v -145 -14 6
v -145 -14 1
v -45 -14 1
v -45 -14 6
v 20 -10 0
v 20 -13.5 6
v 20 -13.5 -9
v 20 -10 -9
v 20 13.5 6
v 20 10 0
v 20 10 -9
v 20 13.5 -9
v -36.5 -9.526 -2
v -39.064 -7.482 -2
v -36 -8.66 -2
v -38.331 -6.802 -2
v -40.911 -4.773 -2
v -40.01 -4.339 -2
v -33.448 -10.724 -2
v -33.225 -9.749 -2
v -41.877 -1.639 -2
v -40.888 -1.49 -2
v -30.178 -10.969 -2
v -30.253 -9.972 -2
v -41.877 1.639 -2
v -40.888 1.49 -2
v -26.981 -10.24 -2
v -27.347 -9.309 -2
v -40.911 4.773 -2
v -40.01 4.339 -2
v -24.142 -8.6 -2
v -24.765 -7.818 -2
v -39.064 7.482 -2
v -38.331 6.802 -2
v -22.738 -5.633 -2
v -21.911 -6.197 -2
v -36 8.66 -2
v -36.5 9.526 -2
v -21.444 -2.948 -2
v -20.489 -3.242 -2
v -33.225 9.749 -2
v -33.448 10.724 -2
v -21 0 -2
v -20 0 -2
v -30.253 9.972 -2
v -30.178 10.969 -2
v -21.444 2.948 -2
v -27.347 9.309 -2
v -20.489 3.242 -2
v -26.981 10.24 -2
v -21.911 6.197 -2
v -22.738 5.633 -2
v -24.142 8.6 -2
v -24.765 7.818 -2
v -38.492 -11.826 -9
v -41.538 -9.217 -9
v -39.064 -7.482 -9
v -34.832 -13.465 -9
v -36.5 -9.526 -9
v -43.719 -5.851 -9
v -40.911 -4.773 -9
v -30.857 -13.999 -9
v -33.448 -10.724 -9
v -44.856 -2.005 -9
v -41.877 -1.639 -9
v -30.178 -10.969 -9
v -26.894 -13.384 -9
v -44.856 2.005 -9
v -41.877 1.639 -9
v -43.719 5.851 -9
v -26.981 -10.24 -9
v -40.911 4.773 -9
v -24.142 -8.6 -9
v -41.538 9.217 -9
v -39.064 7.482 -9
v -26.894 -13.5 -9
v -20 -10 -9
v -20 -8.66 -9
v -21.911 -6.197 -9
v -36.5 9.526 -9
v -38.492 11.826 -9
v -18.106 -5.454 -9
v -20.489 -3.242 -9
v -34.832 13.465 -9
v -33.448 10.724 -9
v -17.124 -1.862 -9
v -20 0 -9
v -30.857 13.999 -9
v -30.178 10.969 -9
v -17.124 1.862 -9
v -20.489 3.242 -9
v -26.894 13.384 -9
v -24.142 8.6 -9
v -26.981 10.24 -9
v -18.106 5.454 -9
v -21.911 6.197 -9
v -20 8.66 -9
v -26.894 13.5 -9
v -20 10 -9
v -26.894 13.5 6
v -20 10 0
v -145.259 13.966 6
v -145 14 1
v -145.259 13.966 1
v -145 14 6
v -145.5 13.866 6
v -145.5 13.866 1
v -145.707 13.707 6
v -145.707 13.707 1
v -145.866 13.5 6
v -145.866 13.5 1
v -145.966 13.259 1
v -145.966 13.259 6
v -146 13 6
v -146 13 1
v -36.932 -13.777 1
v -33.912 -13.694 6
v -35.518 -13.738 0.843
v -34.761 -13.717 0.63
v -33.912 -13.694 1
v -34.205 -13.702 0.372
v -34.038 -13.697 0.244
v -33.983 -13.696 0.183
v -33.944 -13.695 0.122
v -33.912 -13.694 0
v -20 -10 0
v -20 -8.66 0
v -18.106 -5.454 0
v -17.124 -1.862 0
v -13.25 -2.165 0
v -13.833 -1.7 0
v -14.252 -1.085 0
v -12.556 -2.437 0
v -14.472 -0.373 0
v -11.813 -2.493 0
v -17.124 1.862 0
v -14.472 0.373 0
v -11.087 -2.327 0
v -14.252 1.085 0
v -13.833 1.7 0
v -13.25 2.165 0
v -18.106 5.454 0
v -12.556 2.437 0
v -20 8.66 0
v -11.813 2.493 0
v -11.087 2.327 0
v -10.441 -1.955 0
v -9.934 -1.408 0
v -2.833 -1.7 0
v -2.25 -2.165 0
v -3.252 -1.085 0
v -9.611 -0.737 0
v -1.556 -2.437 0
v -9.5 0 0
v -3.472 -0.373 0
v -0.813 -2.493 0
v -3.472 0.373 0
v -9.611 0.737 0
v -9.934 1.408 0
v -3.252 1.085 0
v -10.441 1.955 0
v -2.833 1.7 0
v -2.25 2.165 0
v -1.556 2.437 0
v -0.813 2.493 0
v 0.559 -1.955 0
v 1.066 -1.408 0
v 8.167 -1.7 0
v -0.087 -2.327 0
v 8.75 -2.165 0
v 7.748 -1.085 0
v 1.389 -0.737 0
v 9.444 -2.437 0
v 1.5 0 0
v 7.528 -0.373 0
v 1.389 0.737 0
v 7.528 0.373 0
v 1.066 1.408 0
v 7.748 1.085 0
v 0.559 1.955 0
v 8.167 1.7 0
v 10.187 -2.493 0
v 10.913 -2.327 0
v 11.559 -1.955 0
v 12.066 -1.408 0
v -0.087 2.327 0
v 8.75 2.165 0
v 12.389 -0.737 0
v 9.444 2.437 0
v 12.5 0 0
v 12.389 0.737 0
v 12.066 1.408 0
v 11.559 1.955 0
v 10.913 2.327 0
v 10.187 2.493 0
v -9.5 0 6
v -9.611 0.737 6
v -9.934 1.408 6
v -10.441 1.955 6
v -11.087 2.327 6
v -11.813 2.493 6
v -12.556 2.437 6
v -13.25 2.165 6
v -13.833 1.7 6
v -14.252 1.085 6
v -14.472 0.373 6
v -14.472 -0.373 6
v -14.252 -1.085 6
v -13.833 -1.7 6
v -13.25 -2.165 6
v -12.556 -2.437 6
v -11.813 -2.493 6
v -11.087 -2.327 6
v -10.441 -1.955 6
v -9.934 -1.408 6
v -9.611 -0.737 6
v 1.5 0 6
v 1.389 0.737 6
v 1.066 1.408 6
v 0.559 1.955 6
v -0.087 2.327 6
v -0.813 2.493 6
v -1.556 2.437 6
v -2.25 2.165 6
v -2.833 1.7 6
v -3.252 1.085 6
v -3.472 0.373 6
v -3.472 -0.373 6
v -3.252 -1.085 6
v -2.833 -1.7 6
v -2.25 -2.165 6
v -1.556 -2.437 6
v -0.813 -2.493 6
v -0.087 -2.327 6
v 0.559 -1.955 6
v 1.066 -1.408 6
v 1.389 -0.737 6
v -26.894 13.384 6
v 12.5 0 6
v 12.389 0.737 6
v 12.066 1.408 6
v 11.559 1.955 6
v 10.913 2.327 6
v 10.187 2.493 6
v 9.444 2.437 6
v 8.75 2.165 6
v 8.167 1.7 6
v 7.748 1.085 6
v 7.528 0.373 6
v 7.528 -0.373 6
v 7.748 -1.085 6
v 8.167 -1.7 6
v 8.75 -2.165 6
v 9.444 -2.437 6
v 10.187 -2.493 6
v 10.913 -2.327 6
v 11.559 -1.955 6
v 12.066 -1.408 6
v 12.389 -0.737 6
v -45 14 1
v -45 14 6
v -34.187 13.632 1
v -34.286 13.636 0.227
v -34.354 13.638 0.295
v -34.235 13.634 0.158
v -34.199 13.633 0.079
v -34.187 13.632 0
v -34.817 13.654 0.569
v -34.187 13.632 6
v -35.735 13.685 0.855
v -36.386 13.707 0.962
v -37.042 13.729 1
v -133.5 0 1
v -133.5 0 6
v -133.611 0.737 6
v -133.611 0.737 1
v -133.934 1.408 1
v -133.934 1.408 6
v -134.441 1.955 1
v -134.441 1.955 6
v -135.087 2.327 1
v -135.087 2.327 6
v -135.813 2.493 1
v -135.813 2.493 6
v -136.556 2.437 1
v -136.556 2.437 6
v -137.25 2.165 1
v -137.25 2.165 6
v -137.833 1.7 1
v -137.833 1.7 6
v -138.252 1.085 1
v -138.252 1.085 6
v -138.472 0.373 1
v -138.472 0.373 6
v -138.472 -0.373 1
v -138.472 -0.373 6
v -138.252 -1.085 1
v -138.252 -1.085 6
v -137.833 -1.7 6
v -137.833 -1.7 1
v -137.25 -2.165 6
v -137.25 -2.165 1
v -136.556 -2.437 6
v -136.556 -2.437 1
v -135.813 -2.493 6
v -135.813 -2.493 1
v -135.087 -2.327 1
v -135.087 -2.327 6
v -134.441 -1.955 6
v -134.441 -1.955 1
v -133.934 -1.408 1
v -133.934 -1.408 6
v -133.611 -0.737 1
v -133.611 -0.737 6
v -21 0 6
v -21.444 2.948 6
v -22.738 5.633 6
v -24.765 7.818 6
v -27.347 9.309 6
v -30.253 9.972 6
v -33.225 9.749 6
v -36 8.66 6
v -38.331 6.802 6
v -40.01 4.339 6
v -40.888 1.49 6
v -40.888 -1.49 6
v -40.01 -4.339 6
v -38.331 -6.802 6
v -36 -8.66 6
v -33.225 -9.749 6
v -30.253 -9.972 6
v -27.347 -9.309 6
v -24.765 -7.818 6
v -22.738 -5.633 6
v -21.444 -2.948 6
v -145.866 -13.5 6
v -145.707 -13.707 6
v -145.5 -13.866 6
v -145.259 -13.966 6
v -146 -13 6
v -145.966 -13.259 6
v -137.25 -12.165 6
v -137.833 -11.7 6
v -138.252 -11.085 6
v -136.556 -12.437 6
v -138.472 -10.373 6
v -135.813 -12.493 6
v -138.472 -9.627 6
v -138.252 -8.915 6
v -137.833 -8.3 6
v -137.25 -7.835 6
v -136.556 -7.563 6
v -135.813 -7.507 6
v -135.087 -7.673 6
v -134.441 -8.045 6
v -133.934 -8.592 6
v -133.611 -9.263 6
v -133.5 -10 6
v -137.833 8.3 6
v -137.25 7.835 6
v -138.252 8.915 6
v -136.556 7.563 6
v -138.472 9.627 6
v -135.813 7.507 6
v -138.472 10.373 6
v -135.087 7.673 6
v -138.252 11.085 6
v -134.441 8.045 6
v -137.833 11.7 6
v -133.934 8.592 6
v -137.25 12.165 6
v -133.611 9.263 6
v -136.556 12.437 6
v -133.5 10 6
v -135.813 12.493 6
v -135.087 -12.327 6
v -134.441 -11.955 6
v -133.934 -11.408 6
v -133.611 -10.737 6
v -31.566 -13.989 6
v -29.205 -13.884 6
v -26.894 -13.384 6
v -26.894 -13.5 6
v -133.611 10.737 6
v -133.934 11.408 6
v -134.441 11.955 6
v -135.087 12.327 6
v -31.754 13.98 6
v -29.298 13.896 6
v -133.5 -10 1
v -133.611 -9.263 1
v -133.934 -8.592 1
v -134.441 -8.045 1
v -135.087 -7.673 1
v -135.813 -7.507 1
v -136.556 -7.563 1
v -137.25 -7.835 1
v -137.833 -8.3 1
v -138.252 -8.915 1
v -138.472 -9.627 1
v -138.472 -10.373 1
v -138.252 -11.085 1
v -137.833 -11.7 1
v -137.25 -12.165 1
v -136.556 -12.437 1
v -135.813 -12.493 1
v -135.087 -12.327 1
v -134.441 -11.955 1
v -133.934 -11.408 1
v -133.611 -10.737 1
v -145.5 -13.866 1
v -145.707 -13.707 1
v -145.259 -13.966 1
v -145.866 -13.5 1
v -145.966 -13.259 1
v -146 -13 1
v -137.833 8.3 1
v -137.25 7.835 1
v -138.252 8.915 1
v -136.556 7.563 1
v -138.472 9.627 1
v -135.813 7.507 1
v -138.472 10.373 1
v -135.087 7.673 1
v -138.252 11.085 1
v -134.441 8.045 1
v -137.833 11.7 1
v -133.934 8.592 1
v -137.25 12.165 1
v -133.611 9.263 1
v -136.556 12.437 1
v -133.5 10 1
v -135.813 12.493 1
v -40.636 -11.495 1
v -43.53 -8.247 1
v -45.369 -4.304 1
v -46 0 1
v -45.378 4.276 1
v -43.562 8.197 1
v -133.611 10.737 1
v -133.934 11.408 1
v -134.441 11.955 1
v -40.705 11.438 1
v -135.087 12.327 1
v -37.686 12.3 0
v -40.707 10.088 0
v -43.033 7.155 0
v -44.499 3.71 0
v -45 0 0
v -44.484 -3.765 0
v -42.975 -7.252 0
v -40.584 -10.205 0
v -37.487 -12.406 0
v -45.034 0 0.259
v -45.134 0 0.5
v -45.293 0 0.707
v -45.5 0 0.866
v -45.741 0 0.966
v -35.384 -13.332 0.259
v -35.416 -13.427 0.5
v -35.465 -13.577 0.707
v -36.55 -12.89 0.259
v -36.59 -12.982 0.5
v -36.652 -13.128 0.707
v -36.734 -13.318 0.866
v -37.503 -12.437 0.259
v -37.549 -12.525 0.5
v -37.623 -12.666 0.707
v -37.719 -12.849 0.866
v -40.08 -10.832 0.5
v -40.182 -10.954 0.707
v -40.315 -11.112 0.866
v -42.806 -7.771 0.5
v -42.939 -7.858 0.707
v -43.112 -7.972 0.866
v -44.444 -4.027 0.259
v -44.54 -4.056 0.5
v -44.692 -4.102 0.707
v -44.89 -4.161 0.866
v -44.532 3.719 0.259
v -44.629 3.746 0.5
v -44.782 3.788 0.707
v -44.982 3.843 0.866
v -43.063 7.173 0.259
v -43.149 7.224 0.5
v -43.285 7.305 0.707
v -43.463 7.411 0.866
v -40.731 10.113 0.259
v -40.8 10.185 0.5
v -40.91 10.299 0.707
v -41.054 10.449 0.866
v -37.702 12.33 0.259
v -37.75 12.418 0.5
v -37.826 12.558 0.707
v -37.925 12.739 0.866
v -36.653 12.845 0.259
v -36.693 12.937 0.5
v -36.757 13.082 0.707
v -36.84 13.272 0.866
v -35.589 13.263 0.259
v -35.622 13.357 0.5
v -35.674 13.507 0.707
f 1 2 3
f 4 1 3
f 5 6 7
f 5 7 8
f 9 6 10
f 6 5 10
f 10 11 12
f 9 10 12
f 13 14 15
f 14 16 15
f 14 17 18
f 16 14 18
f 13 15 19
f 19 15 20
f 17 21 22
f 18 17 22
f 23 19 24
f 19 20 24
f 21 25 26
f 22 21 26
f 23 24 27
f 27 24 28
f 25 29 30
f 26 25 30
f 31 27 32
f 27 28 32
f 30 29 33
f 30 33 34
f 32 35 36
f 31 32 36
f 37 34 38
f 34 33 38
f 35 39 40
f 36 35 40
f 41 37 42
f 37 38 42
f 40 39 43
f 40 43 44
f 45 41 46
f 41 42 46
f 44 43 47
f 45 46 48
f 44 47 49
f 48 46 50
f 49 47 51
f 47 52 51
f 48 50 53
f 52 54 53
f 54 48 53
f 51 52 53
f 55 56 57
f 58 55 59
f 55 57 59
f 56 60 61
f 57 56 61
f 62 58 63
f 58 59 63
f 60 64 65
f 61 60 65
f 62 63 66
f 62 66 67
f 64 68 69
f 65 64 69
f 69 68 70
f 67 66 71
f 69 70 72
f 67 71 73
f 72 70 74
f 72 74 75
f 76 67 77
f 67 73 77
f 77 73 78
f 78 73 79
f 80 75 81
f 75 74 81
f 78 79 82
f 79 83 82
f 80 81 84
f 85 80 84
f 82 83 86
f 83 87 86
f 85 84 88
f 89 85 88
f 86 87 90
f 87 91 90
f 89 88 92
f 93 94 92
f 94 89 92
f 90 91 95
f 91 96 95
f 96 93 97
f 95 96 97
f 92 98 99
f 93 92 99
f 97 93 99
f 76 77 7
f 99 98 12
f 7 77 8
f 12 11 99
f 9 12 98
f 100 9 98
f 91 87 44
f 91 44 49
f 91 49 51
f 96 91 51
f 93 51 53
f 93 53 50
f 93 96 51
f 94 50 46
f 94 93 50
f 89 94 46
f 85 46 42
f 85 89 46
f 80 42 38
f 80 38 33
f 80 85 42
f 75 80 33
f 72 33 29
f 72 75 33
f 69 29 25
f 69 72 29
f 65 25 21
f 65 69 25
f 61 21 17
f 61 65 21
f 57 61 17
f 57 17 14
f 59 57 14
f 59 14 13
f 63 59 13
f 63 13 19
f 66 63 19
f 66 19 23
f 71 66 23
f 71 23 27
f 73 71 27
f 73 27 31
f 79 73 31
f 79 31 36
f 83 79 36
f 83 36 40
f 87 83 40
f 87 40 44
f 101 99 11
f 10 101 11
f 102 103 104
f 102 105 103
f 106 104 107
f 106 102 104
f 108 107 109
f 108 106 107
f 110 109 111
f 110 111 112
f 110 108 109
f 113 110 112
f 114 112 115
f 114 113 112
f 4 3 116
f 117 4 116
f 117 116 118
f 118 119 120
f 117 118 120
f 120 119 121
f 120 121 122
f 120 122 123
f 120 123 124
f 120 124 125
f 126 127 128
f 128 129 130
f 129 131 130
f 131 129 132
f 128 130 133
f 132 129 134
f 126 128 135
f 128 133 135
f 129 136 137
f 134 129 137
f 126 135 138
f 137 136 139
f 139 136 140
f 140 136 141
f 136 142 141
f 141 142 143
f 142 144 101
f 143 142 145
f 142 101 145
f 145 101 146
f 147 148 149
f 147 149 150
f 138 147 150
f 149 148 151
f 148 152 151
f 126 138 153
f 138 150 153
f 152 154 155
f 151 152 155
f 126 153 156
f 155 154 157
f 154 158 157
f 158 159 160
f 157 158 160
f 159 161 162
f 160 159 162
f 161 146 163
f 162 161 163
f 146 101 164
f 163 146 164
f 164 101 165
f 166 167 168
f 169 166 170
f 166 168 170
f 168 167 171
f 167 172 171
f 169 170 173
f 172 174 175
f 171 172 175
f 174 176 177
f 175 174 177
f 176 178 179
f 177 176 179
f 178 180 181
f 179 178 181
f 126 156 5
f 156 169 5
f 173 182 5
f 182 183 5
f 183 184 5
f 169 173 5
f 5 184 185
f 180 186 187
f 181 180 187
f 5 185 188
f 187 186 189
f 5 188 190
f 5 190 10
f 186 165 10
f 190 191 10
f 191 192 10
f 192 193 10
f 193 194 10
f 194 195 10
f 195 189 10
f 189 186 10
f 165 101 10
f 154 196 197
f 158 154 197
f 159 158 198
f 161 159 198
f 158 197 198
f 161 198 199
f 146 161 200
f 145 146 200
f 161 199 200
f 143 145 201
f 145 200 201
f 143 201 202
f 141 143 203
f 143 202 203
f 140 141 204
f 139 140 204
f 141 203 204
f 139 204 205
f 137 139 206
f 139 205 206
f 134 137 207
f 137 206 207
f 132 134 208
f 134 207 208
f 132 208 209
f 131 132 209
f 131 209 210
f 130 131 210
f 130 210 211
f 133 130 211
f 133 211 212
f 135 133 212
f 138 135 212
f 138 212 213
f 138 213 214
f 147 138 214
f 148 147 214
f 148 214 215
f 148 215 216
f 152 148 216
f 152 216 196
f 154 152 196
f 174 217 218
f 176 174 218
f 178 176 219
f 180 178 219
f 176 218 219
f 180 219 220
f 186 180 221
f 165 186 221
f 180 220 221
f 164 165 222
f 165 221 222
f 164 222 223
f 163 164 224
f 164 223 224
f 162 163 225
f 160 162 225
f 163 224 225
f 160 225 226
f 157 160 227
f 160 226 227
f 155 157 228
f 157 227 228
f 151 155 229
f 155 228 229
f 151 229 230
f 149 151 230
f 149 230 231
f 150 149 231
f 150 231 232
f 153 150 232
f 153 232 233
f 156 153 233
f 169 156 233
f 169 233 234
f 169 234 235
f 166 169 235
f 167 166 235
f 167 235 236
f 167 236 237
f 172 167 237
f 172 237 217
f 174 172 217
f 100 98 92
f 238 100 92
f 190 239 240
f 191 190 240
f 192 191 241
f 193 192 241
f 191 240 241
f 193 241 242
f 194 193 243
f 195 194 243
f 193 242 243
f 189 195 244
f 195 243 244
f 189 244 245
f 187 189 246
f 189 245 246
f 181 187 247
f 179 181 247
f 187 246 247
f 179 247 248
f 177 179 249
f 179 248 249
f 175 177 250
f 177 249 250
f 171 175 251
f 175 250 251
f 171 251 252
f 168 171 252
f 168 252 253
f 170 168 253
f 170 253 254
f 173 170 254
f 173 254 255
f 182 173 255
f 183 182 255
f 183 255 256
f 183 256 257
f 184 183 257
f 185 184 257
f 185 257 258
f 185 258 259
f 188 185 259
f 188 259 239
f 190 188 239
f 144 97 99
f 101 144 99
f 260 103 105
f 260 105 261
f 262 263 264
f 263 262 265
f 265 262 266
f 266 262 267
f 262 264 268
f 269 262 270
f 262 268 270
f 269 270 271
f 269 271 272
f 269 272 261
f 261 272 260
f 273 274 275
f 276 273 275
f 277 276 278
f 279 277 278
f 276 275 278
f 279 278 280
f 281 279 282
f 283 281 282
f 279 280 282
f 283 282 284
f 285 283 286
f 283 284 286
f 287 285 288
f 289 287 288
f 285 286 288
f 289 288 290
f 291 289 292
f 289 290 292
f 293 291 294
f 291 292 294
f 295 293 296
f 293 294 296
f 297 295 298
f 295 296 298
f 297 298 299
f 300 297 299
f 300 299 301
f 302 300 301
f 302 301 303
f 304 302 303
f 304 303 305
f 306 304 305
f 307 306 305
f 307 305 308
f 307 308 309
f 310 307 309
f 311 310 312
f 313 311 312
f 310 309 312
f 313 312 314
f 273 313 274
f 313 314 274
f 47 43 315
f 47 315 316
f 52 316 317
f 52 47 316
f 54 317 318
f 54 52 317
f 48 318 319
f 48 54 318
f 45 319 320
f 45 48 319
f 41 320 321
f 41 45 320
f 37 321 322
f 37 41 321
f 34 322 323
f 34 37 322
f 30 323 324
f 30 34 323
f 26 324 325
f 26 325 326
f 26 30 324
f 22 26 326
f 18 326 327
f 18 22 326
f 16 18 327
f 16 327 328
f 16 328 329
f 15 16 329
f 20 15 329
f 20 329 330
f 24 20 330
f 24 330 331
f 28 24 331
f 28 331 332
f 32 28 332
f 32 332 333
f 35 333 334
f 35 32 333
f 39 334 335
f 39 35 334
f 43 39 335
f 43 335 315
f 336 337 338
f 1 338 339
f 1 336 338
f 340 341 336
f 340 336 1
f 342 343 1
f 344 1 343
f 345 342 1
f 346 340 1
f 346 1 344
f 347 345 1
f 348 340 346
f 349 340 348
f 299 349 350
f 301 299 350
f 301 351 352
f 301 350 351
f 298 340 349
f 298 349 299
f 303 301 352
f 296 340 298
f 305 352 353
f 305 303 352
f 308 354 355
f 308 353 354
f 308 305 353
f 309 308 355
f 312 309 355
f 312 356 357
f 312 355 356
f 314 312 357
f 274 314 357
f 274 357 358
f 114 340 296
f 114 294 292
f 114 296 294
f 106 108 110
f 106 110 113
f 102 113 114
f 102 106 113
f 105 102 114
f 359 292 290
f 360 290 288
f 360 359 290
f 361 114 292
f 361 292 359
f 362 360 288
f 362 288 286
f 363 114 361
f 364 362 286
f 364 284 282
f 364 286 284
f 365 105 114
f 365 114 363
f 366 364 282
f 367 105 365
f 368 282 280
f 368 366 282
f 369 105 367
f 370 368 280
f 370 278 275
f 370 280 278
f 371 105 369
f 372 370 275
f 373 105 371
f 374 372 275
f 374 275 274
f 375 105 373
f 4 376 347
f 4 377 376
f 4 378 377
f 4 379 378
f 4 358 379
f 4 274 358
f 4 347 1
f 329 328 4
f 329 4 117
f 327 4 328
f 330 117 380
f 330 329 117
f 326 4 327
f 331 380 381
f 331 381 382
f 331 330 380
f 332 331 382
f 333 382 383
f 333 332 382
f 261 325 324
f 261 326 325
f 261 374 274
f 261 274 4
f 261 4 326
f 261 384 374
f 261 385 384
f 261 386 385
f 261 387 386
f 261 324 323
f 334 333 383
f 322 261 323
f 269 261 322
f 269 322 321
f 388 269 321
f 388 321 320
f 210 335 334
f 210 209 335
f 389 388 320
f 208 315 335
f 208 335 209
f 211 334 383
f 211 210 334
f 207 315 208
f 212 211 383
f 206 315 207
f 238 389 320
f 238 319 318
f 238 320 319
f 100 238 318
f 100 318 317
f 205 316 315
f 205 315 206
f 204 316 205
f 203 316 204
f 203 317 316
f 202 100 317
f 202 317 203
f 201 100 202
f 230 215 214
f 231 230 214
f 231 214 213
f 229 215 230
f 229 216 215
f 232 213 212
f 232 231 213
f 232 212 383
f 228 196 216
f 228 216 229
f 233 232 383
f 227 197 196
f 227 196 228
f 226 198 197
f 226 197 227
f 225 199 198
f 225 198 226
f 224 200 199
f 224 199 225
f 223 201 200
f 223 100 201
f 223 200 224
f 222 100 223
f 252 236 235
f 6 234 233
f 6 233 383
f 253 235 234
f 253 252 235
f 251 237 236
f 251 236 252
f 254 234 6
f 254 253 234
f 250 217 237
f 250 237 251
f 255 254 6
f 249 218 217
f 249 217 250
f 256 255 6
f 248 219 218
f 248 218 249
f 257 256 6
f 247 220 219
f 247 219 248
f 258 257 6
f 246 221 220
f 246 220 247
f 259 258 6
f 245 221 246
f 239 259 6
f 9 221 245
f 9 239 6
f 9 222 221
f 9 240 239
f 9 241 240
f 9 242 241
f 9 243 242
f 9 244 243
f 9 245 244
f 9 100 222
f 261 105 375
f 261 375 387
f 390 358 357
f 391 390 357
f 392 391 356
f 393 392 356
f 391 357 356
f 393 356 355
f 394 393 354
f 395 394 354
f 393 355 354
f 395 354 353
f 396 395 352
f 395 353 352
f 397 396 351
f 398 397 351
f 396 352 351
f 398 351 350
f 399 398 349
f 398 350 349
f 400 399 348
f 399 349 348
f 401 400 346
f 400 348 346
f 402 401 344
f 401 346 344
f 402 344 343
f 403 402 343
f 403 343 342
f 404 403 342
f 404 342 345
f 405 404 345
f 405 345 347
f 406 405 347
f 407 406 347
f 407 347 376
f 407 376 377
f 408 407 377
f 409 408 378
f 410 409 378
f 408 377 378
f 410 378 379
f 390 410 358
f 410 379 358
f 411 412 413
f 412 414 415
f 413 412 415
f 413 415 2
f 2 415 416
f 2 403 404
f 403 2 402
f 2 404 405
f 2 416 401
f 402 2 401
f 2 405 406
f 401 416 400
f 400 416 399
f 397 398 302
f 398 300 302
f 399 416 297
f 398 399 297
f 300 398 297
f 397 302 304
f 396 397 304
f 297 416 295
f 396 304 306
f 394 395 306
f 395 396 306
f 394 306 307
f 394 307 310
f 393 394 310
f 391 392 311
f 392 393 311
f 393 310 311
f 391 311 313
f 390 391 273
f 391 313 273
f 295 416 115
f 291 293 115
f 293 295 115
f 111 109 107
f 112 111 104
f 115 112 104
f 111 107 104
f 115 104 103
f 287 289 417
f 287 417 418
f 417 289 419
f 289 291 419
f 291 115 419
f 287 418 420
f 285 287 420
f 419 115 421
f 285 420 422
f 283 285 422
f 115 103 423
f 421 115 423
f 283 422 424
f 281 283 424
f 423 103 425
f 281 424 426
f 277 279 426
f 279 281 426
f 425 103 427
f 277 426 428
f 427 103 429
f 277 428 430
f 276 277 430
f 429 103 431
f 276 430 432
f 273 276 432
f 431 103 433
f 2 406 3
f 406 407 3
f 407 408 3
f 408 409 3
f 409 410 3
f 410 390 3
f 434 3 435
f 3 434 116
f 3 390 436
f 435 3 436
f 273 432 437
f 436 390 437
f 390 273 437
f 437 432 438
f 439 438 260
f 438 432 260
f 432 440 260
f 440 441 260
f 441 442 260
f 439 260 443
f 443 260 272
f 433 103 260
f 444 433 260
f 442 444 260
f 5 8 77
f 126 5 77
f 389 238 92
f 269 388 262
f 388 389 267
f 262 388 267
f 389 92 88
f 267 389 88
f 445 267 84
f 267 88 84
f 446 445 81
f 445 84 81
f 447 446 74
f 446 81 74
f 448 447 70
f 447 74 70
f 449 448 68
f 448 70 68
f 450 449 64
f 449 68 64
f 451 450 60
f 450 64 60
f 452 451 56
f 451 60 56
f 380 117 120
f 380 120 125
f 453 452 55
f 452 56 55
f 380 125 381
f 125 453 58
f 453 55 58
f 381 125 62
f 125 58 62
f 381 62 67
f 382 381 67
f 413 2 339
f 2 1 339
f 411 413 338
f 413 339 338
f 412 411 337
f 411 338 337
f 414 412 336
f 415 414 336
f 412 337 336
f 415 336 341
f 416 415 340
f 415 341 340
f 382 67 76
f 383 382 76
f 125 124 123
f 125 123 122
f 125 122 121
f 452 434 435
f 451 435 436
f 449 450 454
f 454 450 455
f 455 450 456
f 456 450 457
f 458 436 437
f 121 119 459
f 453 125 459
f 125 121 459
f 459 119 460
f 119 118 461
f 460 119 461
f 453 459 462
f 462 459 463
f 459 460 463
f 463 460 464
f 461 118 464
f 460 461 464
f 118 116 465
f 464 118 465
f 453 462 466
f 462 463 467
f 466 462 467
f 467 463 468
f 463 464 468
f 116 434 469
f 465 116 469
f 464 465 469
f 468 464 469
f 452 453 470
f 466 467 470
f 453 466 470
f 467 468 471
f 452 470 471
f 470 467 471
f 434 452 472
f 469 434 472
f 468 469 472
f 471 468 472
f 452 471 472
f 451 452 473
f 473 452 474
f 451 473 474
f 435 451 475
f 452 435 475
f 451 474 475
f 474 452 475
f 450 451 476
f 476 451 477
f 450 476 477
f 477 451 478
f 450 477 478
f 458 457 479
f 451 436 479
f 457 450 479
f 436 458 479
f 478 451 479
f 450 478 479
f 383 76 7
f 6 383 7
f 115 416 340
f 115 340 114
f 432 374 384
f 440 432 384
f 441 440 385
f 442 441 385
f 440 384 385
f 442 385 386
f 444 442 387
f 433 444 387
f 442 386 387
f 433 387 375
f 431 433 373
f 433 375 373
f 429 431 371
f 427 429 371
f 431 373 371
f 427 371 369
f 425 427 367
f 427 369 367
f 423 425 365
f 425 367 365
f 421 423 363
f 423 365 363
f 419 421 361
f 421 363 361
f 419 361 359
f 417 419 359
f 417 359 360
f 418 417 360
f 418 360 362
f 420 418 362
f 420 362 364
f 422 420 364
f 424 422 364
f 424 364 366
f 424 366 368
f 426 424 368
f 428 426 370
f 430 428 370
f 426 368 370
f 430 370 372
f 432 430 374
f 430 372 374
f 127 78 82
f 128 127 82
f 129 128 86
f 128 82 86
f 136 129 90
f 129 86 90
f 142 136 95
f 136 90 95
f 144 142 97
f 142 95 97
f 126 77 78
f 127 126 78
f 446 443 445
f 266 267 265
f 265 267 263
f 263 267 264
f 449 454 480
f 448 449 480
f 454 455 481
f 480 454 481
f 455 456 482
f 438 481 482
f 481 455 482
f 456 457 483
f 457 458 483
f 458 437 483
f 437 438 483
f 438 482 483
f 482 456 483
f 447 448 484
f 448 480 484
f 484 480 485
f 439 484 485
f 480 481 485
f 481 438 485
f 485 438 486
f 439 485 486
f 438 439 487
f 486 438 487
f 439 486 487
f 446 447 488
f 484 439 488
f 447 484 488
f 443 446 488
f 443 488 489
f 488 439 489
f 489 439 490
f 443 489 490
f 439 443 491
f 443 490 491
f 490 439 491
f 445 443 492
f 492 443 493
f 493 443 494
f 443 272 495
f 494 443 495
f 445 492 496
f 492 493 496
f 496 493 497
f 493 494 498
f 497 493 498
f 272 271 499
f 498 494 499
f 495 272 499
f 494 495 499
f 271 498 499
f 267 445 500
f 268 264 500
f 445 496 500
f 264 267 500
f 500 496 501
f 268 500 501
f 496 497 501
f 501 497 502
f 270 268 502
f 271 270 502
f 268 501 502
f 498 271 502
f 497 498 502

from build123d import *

# Parameters (mm, degrees)
SKETCH_1_W          = 40
SKETCH_1_H          = 20
EXTRUDE_1_DEPTH     = 6
SKETCH_2_R          = 2.5
CUT_EXTRUDE_1_DEPTH = 24.151673806
SKETCH_3_R          = 11
EXTRUDE_2_DEPTH     = 15
SKETCH_5_R          = 11
SKETCH_5_R_2        = 10
EXTRUDE_3_DEPTH     = 8
EXTRUDE_4_DEPTH     = 5
FILLET_1_R          = 1
FILLET_2_R          = 1
SKETCH_9_R          = 2.5
CUT_EXTRUDE_2_DEPTH = 5


with BuildPart() as part:
    # 草图1 → 凸台-拉伸1 (new body)
    with BuildSketch(Plane.XY):
        Rectangle(SKETCH_1_W, SKETCH_1_H)
    extrude(amount=EXTRUDE_1_DEPTH)

    # 草图2 → 切除-拉伸1 (cut, through all)
    with BuildSketch(Plane.XY.offset(6)):
        with Locations((10, 0)):
            Circle(SKETCH_2_R)
        with Locations((-1, 0)):
            Circle(SKETCH_2_R)
        with Locations((-12, 0)):
            Circle(SKETCH_2_R)
    extrude(amount=-CUT_EXTRUDE_1_DEPTH, mode=Mode.SUBTRACT)

    # 草图3 → 凸台-拉伸2 (add)
    with BuildSketch(Plane.XY.offset(6)):
        with BuildLine():
            Line((20, 10), (20, 13.5))
            Line((20, 13.5), (-26.893967141, 13.5))
            Line((-26.893967141, 13.5), (-26.893967141, 13.384337644))
            ThreePointArc((-26.893967141, 13.384337644), (-45, 0), (-26.893967141, -13.384337644))
            Line((-26.893967141, -13.384337644), (-26.893967141, -13.5))
            Line((-26.893967141, -13.5), (20, -13.5))
            Line((20, -13.5), (20, -10))
            Line((20, -10), (-20, -10))
            Line((-20, -10), (-20, -8.660254038))
            ThreePointArc((-20, -8.660254038), (-17, 0), (-20, 8.660254038))
            Line((-20, 8.660254038), (-20, 10))
            Line((-20, 10), (20, 10))
        make_face()
        with Locations((-31, 0)):
            Circle(SKETCH_3_R, mode=Mode.SUBTRACT)
    extrude(amount=-EXTRUDE_2_DEPTH)

    # 草图5 → 凸台-拉伸3 (add)
    with BuildSketch(Plane.XY.offset(6)):
        with Locations((-31, 0)):
            Circle(SKETCH_5_R)
        with Locations((-31, 0)):
            Circle(SKETCH_5_R_2, mode=Mode.SUBTRACT)
    extrude(amount=-EXTRUDE_3_DEPTH)

    # 草图8 → 凸台-拉伸4 (add)
    with BuildSketch(Plane.XY.offset(6)):
        with BuildLine():
            ThreePointArc((-33.911999365, -13.693803697), (-44.999289152, -0.141078849), (-34.187380521, 13.632336755))
            Line((-34.187380521, 13.632336755), (-45, 14))
            Line((-45, 14), (-146, 14))
            Line((-146, 14), (-146, -14))
            Line((-146, -14), (-45, -14))
            Line((-45, -14), (-33.911999365, -13.693803697))
        make_face()
    extrude(amount=-EXTRUDE_4_DEPTH)

    # 圆角1
    fillet_1_edges = [part.edges().sort_by_distance(p)[0] for p in [
        (-44.999289152, -0.141078849, 1),
    ]]
    fillet(fillet_1_edges, radius=FILLET_1_R)

    # 圆角2
    fillet_2_edges = [part.edges().sort_by_distance(p)[0] for p in [
        (-146, 14, 3.5),
        (-146, -14, 3.5),
    ]]
    fillet(fillet_2_edges, radius=FILLET_2_R)

    # 草图9 → 切除-拉伸2 (cut)
    with BuildSketch(Plane.XY.offset(6)):
        with Locations((-136, 0)):
            Circle(SKETCH_9_R)
        with Locations((-136, 10)):
            Circle(SKETCH_9_R)
        with Locations((-136, -10)):
            Circle(SKETCH_9_R)
    extrude(amount=-CUT_EXTRUDE_2_DEPTH, mode=Mode.SUBTRACT)


solid = part.part
